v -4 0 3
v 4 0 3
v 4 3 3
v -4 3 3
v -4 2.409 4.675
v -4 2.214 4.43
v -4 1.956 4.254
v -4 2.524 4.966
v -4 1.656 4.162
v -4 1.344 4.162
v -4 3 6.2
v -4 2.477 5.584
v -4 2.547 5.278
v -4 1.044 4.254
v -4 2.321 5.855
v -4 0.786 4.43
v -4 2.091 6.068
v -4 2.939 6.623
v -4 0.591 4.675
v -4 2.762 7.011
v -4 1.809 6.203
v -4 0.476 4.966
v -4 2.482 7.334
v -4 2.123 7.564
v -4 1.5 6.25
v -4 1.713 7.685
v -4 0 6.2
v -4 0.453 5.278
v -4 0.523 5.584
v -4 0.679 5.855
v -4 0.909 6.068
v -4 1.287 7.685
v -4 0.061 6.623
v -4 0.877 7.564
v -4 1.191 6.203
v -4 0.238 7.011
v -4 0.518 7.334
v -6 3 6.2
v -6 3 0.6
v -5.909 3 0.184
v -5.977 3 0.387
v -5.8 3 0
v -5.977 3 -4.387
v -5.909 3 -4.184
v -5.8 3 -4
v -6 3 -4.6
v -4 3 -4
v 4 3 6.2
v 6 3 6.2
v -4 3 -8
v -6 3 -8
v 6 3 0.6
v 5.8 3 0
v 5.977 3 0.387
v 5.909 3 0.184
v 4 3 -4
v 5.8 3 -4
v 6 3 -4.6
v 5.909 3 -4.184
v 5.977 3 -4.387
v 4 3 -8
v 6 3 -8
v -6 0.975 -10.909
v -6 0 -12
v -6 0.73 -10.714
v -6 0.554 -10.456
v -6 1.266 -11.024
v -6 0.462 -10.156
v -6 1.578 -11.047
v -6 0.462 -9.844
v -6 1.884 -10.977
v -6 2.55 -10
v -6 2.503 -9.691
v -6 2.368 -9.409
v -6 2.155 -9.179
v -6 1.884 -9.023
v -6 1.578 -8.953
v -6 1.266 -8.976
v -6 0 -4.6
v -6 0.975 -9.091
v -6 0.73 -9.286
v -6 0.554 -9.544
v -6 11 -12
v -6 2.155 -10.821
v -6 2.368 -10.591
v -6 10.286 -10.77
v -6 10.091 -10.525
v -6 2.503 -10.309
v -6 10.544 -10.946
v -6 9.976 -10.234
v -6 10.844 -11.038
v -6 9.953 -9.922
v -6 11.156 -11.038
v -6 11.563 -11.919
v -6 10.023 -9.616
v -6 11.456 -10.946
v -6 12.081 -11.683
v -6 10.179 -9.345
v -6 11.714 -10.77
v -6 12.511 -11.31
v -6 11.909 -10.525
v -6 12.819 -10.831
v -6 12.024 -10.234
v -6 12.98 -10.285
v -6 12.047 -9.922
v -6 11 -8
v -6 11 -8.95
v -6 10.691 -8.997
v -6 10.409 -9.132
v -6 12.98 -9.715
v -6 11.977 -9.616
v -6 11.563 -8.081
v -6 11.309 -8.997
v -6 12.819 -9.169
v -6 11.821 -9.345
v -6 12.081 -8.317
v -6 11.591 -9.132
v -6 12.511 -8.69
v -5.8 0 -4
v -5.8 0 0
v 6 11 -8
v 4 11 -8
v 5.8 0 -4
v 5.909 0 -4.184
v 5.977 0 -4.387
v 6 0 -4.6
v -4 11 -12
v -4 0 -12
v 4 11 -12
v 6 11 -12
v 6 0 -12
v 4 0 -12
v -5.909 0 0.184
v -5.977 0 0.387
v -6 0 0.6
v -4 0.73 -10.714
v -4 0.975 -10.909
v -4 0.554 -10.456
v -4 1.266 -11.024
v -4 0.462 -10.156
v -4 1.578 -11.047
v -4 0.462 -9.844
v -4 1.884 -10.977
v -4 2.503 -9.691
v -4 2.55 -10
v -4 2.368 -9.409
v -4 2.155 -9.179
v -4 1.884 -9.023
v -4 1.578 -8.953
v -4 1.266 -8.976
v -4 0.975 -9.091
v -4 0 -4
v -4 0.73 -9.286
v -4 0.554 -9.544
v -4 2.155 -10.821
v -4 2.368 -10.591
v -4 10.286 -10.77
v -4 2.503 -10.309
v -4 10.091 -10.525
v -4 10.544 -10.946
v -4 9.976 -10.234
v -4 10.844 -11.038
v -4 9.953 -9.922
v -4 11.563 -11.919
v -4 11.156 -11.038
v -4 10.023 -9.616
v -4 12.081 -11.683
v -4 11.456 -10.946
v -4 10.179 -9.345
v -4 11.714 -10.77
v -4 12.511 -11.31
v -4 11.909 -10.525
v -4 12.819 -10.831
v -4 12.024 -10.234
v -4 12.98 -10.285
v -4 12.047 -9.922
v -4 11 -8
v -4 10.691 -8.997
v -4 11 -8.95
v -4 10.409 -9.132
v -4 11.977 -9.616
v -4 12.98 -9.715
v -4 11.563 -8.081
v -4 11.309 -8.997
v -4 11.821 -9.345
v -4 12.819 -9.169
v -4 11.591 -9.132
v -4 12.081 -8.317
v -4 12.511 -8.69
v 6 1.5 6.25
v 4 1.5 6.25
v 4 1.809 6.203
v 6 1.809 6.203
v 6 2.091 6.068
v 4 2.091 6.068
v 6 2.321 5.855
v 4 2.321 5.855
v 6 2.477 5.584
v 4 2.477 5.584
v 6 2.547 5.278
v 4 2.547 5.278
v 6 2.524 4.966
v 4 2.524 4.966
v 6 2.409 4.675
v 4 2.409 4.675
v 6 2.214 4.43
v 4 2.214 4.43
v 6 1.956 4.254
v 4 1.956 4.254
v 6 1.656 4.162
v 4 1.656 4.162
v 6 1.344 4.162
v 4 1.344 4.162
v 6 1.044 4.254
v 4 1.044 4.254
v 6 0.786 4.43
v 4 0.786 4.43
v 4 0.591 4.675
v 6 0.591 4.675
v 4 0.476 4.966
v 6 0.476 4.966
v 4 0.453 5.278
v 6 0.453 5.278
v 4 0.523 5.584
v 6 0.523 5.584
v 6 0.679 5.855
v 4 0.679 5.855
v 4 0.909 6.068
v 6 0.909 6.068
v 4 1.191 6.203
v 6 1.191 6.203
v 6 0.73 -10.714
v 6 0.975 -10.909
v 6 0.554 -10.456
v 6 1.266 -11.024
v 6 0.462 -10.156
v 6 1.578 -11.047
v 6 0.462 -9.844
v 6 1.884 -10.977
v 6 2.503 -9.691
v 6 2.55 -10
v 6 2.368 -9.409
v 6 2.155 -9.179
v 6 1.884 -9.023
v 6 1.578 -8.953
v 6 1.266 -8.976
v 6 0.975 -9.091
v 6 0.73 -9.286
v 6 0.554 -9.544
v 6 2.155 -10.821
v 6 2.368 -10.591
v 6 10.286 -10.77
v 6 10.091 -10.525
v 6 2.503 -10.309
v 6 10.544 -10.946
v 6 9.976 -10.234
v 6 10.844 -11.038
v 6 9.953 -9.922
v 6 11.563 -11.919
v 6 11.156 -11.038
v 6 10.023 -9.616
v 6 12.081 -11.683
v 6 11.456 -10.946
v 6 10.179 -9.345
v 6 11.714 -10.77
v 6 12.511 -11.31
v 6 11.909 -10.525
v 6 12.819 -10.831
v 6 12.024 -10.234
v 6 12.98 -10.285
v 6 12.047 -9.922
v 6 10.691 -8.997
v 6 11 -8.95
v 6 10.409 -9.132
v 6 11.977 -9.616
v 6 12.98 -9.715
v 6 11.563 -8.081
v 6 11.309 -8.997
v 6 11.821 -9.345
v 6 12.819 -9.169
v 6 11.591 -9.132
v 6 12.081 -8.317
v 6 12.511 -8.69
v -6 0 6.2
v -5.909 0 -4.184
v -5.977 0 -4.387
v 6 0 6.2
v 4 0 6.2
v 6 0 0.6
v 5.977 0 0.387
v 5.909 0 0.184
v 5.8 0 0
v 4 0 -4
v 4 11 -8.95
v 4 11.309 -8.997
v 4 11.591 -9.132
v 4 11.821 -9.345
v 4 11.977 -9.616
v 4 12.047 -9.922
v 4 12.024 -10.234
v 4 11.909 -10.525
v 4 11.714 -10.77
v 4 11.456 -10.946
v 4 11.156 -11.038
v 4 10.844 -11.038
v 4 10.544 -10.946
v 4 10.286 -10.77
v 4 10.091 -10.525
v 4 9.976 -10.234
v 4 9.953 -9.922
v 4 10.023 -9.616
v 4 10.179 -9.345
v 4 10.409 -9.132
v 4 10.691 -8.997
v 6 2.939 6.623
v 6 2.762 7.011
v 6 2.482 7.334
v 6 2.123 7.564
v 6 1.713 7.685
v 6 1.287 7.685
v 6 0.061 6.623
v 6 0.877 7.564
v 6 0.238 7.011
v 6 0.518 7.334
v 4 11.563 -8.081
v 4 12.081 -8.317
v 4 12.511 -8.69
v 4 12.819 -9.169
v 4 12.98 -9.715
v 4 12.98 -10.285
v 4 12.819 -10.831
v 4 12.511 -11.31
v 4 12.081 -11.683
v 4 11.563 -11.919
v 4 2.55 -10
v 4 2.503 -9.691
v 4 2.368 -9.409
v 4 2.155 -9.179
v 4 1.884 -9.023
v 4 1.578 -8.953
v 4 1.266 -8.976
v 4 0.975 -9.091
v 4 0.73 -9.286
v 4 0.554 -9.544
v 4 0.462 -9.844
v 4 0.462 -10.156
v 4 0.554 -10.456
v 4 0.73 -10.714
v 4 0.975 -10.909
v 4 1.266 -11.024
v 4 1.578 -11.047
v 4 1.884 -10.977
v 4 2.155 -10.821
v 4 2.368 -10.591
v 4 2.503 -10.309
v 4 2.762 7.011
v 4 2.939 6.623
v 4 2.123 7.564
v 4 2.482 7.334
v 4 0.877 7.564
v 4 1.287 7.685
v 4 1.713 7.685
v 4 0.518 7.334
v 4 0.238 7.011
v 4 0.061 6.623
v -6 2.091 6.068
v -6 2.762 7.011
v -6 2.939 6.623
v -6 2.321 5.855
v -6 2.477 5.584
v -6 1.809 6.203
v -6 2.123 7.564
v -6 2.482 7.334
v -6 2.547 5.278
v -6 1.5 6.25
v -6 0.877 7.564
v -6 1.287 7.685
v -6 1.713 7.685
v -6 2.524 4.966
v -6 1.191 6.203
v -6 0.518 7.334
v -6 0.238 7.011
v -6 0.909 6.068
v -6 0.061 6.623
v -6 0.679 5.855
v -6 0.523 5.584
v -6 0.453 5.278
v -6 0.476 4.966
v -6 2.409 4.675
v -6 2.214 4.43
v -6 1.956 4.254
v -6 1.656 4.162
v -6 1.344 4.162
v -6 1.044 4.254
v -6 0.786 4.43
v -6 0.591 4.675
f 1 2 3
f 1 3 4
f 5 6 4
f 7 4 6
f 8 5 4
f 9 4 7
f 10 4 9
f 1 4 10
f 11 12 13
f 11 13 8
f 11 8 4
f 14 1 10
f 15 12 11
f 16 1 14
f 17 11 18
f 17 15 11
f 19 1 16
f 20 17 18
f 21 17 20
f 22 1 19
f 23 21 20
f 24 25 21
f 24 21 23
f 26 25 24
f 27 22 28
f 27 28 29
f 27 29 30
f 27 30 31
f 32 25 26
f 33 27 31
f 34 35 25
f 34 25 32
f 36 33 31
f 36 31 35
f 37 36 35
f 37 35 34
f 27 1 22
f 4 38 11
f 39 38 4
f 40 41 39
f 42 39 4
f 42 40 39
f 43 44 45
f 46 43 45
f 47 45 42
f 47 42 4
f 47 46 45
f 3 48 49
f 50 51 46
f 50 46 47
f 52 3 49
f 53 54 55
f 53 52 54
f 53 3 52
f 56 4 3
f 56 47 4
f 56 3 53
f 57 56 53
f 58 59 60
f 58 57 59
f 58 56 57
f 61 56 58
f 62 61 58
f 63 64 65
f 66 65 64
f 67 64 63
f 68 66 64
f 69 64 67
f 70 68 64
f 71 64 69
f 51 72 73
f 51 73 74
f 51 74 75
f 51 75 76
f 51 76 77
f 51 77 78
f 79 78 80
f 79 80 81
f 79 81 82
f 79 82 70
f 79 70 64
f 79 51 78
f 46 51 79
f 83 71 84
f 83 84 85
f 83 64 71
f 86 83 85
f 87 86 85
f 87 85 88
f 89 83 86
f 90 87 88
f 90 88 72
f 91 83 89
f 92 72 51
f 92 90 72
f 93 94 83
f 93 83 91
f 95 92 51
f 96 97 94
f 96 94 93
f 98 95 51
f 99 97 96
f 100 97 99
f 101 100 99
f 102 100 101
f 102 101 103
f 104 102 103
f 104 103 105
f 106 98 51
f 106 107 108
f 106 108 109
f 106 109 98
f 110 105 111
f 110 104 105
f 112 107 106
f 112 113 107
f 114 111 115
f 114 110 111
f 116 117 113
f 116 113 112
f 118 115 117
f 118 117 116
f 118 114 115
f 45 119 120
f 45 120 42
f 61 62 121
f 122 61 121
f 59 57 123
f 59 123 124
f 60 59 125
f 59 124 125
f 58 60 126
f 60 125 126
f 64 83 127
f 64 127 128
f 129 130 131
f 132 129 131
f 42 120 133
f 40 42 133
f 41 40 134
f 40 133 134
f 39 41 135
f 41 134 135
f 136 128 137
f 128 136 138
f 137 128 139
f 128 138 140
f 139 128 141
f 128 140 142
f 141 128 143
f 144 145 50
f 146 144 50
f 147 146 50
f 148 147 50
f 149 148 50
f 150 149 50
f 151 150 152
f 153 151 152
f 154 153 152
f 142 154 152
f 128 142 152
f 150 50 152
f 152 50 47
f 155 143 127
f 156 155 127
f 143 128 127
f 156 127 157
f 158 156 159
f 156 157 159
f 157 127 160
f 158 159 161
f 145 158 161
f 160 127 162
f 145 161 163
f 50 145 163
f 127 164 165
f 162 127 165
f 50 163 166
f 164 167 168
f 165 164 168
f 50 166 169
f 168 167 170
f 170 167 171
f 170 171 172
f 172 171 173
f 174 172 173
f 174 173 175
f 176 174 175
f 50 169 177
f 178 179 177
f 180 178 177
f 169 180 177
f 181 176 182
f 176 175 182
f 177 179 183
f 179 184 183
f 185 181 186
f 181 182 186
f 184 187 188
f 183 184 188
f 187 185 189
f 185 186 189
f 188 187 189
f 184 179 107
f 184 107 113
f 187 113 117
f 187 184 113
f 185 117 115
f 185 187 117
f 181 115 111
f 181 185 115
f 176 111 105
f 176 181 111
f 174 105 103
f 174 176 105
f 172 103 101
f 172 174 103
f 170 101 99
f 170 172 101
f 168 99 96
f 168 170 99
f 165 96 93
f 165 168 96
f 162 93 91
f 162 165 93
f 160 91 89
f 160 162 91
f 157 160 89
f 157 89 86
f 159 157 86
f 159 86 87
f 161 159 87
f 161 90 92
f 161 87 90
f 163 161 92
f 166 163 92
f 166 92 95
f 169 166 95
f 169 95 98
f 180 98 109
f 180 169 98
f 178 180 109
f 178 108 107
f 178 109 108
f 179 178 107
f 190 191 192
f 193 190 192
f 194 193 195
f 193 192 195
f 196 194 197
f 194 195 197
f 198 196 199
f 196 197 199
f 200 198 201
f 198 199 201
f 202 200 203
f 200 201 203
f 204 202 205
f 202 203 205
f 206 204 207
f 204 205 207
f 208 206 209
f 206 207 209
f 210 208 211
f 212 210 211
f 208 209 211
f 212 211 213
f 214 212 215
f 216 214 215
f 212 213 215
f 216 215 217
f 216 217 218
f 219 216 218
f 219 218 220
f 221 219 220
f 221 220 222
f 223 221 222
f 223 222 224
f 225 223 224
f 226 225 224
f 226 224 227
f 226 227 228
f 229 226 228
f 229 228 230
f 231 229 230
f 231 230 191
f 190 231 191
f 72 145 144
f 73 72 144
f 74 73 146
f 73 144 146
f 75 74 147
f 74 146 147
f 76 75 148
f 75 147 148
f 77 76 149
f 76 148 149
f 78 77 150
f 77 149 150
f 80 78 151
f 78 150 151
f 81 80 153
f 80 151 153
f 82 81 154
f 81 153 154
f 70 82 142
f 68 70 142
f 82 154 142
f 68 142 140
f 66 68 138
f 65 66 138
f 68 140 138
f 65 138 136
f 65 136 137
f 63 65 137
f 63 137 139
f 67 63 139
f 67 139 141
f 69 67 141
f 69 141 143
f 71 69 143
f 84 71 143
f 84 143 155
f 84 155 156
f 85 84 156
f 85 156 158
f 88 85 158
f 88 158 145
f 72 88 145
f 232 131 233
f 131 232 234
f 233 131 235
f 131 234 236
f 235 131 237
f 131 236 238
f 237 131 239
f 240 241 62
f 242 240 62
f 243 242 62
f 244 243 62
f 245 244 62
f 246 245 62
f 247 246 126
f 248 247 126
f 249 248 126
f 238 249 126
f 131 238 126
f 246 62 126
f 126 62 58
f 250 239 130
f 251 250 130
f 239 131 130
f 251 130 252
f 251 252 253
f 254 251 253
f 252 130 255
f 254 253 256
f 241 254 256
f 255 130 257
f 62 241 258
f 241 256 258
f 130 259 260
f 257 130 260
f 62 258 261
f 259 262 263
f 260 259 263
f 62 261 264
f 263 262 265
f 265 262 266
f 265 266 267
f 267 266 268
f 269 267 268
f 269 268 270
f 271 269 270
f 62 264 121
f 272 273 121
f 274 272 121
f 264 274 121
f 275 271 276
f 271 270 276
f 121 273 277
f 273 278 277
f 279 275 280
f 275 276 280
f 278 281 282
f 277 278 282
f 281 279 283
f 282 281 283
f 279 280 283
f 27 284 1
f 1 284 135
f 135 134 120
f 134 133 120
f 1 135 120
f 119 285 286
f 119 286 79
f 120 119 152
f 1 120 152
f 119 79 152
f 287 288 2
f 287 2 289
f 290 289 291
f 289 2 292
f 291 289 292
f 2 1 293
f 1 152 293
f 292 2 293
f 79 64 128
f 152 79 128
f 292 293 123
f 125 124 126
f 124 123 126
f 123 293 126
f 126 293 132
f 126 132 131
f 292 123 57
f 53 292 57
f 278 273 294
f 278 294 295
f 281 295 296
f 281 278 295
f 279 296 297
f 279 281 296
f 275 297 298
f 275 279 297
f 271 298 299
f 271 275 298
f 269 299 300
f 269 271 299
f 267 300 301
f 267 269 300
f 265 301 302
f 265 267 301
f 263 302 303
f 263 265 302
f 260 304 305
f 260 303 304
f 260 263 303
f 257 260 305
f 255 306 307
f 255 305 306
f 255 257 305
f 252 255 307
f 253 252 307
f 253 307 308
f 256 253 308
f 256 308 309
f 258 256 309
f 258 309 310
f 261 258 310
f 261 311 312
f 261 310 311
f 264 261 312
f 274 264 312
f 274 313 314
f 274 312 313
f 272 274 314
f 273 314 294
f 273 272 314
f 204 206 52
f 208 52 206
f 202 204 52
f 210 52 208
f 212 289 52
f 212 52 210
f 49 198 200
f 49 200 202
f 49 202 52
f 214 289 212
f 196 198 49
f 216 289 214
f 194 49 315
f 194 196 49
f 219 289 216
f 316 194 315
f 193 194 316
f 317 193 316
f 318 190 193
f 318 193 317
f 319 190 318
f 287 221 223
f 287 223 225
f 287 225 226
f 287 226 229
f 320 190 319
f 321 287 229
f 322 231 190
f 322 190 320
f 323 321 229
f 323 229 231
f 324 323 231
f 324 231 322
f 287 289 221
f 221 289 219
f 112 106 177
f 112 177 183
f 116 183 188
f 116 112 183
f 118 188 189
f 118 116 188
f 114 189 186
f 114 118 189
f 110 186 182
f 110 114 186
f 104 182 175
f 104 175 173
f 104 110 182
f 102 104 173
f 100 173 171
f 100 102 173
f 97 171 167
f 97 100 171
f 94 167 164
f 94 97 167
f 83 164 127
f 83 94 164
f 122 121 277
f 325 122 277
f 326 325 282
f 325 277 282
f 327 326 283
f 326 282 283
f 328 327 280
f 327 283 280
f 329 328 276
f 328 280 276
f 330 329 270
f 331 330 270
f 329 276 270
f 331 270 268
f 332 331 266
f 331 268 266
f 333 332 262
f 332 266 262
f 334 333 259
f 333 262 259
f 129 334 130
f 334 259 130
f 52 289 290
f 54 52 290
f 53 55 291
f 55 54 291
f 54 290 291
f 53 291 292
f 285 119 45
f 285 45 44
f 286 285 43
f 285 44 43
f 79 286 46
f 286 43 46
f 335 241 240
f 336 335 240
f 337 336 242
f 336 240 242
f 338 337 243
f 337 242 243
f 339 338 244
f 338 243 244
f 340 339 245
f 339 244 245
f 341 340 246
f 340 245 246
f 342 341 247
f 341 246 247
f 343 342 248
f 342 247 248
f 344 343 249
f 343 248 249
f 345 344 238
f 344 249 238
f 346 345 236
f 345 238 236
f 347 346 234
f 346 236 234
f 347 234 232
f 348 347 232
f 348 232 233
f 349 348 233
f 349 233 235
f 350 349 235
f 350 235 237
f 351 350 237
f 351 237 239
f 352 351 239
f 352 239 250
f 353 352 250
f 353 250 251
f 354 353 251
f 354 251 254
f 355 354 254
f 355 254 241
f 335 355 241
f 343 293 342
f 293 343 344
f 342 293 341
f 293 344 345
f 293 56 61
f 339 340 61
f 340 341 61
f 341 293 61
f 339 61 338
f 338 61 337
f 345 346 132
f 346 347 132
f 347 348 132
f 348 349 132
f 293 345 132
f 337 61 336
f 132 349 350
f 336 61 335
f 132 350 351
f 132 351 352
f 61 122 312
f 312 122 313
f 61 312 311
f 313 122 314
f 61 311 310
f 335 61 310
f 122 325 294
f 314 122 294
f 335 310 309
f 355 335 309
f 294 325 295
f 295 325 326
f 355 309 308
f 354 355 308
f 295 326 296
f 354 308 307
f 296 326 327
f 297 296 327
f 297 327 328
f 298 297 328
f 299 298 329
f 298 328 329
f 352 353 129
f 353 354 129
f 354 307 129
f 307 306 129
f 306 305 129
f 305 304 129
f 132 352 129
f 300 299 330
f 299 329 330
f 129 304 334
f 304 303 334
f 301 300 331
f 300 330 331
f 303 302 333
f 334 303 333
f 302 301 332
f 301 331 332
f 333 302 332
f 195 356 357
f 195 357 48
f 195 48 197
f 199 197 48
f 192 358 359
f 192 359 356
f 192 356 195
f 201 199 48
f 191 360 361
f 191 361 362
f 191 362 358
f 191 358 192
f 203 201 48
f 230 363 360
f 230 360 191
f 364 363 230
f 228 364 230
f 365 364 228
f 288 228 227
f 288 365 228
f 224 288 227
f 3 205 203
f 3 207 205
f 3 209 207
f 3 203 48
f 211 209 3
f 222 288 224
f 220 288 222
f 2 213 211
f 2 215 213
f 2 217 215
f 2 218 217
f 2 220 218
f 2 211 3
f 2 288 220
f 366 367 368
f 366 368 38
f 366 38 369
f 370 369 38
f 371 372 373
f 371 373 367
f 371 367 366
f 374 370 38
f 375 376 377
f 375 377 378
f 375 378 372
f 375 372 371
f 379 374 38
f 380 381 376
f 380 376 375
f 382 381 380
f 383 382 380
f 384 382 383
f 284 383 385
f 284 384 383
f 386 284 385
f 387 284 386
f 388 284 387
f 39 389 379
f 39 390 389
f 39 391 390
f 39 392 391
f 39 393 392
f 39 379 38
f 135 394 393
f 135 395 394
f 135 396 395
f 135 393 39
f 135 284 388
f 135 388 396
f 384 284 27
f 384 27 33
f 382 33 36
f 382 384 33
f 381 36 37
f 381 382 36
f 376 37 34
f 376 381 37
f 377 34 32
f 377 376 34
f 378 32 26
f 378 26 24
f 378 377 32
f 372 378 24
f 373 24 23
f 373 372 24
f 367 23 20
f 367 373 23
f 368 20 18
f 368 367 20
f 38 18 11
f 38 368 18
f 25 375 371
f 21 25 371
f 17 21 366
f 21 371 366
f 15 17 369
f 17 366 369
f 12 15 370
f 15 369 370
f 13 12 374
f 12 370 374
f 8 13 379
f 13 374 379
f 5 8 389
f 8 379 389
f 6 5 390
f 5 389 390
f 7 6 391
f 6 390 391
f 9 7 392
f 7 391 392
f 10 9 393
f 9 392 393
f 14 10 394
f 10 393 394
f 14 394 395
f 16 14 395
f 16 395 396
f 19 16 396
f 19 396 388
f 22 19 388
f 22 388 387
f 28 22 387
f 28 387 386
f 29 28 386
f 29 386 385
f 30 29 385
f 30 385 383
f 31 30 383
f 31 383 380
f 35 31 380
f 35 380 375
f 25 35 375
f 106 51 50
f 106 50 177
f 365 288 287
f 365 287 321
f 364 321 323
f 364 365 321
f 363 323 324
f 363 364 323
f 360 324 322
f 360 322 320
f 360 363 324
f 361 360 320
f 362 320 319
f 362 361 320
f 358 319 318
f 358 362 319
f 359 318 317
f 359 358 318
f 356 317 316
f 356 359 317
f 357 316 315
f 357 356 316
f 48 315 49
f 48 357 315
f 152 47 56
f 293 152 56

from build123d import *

# Parameters (mm, degrees)
EXTRUDE_1_DEPTH          = 3
SKETCH_2_OUTSIDE_W       = 13.724
SKETCH_2_OUTSIDE_H       = 8.024
CUT_EXTRUDE_1_DEPTH      = 12
SKETCH_3_R               = 1.05
CUT_EXTRUDE_2_DEPTH      = 12
SKETCH_4_R               = 0.95
EXTRUDE_2_DEPTH          = 4
SKETCH_5_W               = 12
SKETCH_5_H               = 3
EXTRUDE_3_DEPTH          = 8
SKETCH_6_R               = 1.05
CUT_EXTRUDE_3_DEPTH      = 12
SKETCH_8_W               = 8
SKETCH_8_H               = 4
CUT_EXTRUDE_4_DEPTH      = 8
EXTRUDE_5_DEPTH          = 2
SKETCH_12_W              = 11.6
SKETCH_12_H              = 3
EXTRUDE_8_DEPTH          = 4
FILLET_1_R               = 1
SKETCH_13_W              = 8
SKETCH_13_H              = 4
CUT_EXTRUDE_5_DEPTH      = 10
FILLET_2_R               = 1
CUT_EXTRUDE_6_DEPTH      = 21.322401433
CUT_EXTRUDE_6_DEPTH_BACK = 21.322401433
SKETCH_11_R              = 1.05


with BuildPart() as part:
    # 草图1 → 凸台-拉伸1 (new body)
    with BuildSketch(Plane(origin=(0, 0, 0), x_dir=(1, 0, 0), z_dir=(0, 1, 0))):
        Polygon((-6, 0), (6, 0), (6, -8.7), (4, -8.7), (4, -3), (-4, -3), (-4, -8.7), (-6, -8.7), align=None)
    extrude(amount=EXTRUDE_1_DEPTH)

    # 草图2 outside → 切除-拉伸1 (cut)
    with BuildSketch(Plane.ZY.offset(6)):
        with Locations((4.35, 1.5)):
            Rectangle(SKETCH_2_OUTSIDE_W, SKETCH_2_OUTSIDE_H)
        with BuildLine():
            Line((6.2, 3), (0, 3))
            Line((0, 3), (0, 0))
            Line((0, 0), (6.2, 0))
            ThreePointArc((6.2, 0), (7.7, 1.5), (6.2, 3))
        make_face(mode=Mode.SUBTRACT)
    extrude(amount=-CUT_EXTRUDE_1_DEPTH, mode=Mode.SUBTRACT)

    # 草图3 → 切除-拉伸2 (cut)
    with BuildSketch(Plane.ZY.offset(6)):
        with Locations((5.2, 1.5)):
            Circle(SKETCH_3_R)
    extrude(amount=-CUT_EXTRUDE_2_DEPTH, mode=Mode.SUBTRACT)

    # 草图4 → 凸台-拉伸2 (add)
    with BuildSketch(Plane(origin=(0, 0, 0), x_dir=(-1, 0, 0), z_dir=(0, 0, -1))):
        with Locations((0, 1.5)):
            Circle(SKETCH_4_R)
    extrude(amount=EXTRUDE_2_DEPTH)

    # 草图5 → 凸台-拉伸3 (add)
    with BuildSketch(Plane(origin=(0, 0, -4), x_dir=(-1, 0, 0), z_dir=(0, 0, -1))):
        with Locations((0, 1.5)):
            Rectangle(SKETCH_5_W, SKETCH_5_H)
    extrude(amount=EXTRUDE_3_DEPTH)

    # 草图6 → 切除-拉伸3 (cut)
    with BuildSketch(Plane(origin=(6, 0, 0), x_dir=(0, 0, -1), z_dir=(1, 0, 0))):
        with Locations(Location((10, 1.5, 0), (0, 0, 90))):
            Circle(SKETCH_6_R)
    extrude(amount=-CUT_EXTRUDE_3_DEPTH, mode=Mode.SUBTRACT)

    # 草图8 → 切除-拉伸4 (cut)
    with BuildSketch(Plane(origin=(0, 3, 0), x_dir=(1, 0, 0), z_dir=(0, 1, 0))):
        with Locations((0, 10)):
            Rectangle(SKETCH_8_W, SKETCH_8_H)
    extrude(amount=-CUT_EXTRUDE_4_DEPTH, mode=Mode.SUBTRACT)

    # 草图10 → 凸台-拉伸5 (add)
    with BuildSketch(Plane.ZY.offset(6)):
        with BuildLine():
            Line((-12, 3), (-8, 3))
            Line((-8, 3), (-8, 11))
            ThreePointArc((-8, 11), (-10, 13), (-12, 11))
            Line((-12, 11), (-12, 3))
        make_face()
    extrude_5 = extrude(amount=-EXTRUDE_5_DEPTH)

    # 镜向1: 凸台-拉伸5 across plane
    add(extrude_5.mirror(Plane(origin=(0, 0, 0), x_dir=(0, 0, 1), z_dir=(1, 0, 0))))

    # 草图12 → 凸台-拉伸8 (add)
    with BuildSketch(Plane.XY.offset(-4)):
        with Locations((0, 1.5)):
            Rectangle(SKETCH_12_W, SKETCH_12_H)
    extrude(amount=EXTRUDE_8_DEPTH)

    # 圆角1
    # the kernel refuses this fillet: 1 mm, written as the material it takes off along each edge
    with BuildSketch(Plane(origin=(6, -1.5, 0), x_dir=(-1, 0, 0), z_dir=(0, 1, 0))) as fillet_1_piece_1:
        with BuildLine():
            CenterArc((1, 0.6), FILLET_1_R, 180, 36.869897646)
            Line((0, 0.6), (-0.02, 0.6))
            Line((-0.02, 0.6), (-0.02, 0))
            Line((-0.02, 0), (0, -0.02))
            ThreePointArc((0, -0.02), (0.1, -0.02), (0.184, -0.012))
            Line((0.184, -0.012), (0.2, 0))
        make_face()
    extrude(amount=6, mode=Mode.SUBTRACT)
    with BuildSketch(Plane(origin=(-6, -1.5, 0), x_dir=(1, 0, 0), z_dir=(0, 1, 0))) as fillet_1_piece_2:
        with BuildLine():
            CenterArc((1, -0.6), FILLET_1_R, 143.130102354, 36.869897646)
            Line((0, -0.6), (-0.02, -0.6))
            Line((-0.02, -0.6), (-0.02, 0))
            Line((-0.02, 0), (0, 0.02))
            ThreePointArc((0, 0.02), (0.1, 0.02), (0.184, 0.012))
            Line((0.184, 0.012), (0.2, 0))
        make_face()
    extrude(amount=6, mode=Mode.SUBTRACT)

    # 草图13 → 切除-拉伸5 (cut)
    with BuildSketch(Plane(origin=(0, 3, 0), x_dir=(1, 0, 0), z_dir=(0, 1, 0))):
        with Locations((0, 6)):
            Rectangle(SKETCH_13_W, SKETCH_13_H)
    extrude(amount=-CUT_EXTRUDE_5_DEPTH, mode=Mode.SUBTRACT)

    # 圆角2
    # the kernel refuses this fillet: 1 mm, written as the material it takes off along each edge
    with BuildSketch(Plane(origin=(-6, 4.5, -4), x_dir=(0, 0, -1), z_dir=(0, -1, 0)), Plane(origin=(6, -1.5, -4), x_dir=(0, 0, -1), z_dir=(0, 1, 0))) as fillet_2_piece_1:
        with BuildLine():
            CenterArc((0.6, 1), FILLET_2_R, 233.130102354, 36.869897646)
            Line((0, 0.2), (-0.012, 0.184))
            ThreePointArc((-0.012, 0.184), (-0.02, 0.1), (-0.02, 0))
            Line((-0.02, 0), (0, -0.02))
            Line((0, -0.02), (0.6, -0.02))
            Line((0.6, -0.02), (0.6, 0))
        make_face()
    extrude(amount=6, mode=Mode.SUBTRACT)

    # 草图11 → 切除-拉伸6 (cut, two sides: drawn at the far end of the back side and taken through both)
    with BuildSketch(Plane.ZY.offset(4).offset(-CUT_EXTRUDE_6_DEPTH_BACK)):
        with Locations((-10, 11)):
            Circle(SKETCH_11_R)
    extrude(amount=CUT_EXTRUDE_6_DEPTH + CUT_EXTRUDE_6_DEPTH_BACK, mode=Mode.SUBTRACT)


solid = part.part
